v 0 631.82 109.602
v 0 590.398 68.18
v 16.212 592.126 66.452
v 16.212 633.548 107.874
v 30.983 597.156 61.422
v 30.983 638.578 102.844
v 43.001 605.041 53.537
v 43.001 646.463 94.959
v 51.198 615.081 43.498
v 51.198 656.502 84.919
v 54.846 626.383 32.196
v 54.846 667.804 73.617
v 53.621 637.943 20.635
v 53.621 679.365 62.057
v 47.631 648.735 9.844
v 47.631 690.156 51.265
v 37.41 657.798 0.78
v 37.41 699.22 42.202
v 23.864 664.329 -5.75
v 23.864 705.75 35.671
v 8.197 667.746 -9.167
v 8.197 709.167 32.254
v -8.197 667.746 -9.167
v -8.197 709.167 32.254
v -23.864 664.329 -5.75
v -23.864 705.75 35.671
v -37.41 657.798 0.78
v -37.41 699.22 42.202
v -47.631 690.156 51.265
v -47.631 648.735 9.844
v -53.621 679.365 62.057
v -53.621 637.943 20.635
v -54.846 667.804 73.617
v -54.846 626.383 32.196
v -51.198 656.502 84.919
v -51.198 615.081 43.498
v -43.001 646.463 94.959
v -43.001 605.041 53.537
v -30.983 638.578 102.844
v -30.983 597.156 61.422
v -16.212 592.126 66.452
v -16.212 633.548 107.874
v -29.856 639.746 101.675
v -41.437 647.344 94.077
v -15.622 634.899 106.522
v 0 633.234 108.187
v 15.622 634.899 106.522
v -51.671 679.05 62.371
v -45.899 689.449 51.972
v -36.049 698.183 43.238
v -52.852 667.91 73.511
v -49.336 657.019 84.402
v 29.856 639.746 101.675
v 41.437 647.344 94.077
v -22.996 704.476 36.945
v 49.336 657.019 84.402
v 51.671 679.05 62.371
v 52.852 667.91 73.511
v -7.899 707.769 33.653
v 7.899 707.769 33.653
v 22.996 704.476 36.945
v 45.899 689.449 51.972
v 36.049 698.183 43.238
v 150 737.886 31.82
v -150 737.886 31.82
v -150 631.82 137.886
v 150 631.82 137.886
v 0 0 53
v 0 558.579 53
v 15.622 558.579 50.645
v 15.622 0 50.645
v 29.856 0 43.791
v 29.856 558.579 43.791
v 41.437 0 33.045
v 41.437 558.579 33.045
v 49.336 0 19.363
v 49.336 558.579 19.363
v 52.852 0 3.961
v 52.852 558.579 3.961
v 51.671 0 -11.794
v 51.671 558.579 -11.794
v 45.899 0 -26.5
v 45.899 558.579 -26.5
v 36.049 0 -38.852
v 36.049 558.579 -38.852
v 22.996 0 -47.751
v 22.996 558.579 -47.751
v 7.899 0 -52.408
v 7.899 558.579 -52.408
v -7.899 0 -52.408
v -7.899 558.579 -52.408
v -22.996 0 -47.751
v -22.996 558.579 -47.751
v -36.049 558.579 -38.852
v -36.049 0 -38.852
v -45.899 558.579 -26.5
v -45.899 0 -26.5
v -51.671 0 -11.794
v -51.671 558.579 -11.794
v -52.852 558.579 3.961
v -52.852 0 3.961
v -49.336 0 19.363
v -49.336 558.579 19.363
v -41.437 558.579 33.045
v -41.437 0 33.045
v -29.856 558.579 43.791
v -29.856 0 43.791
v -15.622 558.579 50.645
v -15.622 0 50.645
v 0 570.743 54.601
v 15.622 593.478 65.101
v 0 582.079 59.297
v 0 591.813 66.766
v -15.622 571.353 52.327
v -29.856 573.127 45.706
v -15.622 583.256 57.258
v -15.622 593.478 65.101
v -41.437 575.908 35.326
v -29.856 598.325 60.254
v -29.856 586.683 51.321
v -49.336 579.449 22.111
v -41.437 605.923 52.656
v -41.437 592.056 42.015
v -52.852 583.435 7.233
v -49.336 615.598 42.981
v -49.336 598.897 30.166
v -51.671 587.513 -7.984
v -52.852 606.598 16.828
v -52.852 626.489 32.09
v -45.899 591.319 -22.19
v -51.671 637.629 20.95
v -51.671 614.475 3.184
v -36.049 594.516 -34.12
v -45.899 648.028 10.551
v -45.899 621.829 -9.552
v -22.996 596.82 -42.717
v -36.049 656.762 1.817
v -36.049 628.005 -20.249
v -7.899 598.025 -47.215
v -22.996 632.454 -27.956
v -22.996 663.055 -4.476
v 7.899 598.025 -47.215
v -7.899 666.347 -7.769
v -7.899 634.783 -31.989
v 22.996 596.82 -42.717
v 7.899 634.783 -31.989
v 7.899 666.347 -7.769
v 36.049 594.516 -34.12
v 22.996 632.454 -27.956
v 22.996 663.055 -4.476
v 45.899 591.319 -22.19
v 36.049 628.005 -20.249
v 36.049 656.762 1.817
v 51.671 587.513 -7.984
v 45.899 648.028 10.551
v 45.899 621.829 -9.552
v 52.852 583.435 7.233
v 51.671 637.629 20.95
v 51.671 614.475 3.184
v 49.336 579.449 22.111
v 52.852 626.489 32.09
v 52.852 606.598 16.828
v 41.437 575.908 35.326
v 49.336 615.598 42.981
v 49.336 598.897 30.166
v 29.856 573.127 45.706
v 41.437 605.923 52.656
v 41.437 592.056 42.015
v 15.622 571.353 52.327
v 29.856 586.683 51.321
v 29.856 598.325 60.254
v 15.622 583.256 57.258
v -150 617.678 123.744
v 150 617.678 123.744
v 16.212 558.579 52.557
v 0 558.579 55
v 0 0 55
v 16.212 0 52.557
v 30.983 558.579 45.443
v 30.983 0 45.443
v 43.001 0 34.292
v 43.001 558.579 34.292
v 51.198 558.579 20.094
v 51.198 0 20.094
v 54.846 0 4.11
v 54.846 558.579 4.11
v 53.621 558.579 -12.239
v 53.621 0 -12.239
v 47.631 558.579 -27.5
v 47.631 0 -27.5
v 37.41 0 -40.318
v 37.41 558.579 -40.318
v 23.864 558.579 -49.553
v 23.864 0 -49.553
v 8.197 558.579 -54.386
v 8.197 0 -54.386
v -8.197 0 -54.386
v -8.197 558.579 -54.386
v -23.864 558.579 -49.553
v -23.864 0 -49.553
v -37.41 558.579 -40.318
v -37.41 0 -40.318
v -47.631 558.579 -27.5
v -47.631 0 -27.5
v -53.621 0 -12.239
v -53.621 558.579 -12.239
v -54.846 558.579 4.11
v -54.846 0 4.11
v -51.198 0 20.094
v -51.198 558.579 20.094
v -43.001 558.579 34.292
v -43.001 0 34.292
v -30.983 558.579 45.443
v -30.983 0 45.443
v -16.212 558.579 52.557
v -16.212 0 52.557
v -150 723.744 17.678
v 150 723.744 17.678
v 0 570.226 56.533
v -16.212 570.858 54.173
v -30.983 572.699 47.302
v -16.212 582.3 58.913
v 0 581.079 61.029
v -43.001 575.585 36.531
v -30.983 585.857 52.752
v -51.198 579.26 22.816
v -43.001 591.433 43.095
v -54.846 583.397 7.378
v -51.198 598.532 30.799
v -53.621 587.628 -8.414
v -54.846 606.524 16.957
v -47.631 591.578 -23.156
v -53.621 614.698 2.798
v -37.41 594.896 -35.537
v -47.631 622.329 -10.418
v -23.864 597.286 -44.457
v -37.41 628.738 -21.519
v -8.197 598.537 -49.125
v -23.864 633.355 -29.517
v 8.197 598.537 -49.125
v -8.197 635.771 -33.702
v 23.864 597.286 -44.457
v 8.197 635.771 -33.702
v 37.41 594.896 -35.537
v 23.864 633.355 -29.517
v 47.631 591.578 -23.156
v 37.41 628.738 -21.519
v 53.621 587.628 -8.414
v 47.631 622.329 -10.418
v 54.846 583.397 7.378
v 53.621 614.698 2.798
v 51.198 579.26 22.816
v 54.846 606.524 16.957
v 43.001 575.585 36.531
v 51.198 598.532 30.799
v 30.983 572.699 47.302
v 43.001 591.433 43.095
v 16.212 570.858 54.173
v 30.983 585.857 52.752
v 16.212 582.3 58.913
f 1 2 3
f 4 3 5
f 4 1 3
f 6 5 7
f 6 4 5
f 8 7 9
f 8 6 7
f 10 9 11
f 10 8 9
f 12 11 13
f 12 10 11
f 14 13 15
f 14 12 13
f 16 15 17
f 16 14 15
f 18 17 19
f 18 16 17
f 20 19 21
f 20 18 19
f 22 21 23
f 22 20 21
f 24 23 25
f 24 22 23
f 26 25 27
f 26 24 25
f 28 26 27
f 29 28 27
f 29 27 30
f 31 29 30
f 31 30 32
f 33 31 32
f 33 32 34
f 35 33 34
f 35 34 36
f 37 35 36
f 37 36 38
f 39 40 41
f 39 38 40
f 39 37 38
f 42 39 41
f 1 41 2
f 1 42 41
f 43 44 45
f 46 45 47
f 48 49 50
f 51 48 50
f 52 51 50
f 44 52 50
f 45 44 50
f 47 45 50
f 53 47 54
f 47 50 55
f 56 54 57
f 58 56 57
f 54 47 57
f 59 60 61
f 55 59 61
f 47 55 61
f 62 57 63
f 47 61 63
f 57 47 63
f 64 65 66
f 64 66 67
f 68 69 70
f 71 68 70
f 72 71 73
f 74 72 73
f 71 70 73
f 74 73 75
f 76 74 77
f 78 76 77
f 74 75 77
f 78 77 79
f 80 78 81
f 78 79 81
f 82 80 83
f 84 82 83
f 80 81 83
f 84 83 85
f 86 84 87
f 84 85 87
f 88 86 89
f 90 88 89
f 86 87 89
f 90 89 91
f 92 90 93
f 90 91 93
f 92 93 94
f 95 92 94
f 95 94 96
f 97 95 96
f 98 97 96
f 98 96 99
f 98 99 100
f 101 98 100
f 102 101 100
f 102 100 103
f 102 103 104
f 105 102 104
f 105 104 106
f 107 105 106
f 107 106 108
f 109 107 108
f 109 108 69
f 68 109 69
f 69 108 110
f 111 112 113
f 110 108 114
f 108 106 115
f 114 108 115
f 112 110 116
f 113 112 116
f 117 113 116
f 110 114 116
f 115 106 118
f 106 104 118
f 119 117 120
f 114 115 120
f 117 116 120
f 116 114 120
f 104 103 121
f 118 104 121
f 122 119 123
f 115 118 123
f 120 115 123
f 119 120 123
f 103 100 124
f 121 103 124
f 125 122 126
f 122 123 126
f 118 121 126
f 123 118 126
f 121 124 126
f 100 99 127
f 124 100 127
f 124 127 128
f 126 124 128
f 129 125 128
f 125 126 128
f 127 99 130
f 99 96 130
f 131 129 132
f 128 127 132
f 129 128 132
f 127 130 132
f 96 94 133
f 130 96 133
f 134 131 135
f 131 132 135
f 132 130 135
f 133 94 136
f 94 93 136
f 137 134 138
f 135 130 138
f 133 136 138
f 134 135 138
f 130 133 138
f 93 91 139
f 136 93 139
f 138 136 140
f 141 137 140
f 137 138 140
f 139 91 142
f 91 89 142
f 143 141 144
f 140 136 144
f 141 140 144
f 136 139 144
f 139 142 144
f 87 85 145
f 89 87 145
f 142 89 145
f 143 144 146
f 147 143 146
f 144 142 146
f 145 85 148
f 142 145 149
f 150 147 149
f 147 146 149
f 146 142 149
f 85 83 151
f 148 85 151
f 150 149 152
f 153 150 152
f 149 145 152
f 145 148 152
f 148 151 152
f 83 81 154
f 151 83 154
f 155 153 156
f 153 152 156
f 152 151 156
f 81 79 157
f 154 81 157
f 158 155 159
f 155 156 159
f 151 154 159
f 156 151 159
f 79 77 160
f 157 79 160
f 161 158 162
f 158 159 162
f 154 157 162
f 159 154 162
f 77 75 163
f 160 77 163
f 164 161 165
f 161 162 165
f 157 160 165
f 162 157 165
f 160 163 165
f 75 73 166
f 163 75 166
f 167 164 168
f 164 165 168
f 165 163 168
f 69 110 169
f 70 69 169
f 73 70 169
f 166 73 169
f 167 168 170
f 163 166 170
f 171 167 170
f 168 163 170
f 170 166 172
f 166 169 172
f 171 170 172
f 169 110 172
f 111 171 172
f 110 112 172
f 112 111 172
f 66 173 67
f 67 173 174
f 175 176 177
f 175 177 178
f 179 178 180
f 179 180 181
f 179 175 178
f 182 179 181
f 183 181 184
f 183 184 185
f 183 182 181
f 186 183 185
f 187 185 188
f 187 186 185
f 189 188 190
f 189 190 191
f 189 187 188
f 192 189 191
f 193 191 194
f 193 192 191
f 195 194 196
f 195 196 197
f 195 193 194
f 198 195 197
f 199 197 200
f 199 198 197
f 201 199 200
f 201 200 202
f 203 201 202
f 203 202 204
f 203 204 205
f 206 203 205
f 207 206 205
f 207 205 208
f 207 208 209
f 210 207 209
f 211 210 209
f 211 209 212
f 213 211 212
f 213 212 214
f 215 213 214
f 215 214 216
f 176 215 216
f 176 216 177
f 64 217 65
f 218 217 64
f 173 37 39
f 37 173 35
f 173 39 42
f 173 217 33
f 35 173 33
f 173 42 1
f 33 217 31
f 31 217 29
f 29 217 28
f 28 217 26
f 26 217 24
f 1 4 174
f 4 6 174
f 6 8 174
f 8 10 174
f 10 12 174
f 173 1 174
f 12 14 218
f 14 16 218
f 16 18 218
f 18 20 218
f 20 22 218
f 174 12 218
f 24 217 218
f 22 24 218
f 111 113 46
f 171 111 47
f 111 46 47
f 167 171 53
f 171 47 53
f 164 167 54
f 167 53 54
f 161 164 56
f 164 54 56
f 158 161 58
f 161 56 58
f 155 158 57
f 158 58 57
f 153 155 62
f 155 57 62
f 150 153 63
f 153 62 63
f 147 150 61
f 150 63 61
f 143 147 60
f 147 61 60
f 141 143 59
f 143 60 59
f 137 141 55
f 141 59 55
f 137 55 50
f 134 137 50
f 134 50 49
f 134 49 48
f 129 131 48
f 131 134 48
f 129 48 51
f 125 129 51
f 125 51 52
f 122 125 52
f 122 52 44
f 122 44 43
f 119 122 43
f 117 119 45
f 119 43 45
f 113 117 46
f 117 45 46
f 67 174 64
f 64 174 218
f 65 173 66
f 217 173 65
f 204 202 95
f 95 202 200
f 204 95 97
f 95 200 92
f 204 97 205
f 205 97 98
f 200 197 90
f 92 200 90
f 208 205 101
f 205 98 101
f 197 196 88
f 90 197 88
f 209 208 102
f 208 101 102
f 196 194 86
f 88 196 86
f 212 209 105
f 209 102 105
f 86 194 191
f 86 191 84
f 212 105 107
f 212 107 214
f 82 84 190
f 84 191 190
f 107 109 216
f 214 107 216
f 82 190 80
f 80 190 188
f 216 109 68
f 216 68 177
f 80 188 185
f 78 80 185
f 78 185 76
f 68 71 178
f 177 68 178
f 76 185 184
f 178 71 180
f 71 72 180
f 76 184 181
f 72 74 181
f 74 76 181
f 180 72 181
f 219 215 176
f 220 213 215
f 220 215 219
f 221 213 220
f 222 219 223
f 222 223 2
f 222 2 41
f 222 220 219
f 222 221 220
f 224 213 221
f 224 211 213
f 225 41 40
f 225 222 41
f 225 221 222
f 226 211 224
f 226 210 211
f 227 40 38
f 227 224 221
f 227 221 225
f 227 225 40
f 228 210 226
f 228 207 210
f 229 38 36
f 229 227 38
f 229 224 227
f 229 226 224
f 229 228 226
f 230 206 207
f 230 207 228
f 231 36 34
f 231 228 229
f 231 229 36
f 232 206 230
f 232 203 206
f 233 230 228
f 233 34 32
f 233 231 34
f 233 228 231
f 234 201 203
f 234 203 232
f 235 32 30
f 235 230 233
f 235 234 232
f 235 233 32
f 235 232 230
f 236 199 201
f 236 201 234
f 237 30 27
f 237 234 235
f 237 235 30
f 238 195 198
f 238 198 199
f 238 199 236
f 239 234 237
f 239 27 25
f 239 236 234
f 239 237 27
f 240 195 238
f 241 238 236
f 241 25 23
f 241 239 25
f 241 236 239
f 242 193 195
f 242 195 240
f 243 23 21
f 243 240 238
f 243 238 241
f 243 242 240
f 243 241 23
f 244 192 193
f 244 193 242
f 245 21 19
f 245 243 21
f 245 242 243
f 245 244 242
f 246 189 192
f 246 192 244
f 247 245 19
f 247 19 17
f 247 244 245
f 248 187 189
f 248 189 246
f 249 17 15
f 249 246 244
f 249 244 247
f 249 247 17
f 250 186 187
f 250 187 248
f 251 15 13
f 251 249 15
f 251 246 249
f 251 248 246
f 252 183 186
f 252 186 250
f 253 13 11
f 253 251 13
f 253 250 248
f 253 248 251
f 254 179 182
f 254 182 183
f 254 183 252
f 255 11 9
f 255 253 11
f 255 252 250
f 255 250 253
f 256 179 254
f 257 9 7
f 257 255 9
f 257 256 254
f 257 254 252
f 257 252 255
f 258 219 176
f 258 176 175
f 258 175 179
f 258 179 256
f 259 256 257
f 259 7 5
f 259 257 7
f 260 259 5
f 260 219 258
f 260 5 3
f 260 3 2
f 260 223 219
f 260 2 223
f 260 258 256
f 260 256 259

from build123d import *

# Parameters (mm, degrees)
SWEEP_THIN1_PROFILE_R   = 55
SWEEP_THIN1_PROFILE_R_2 = 53
SKETCH69_W              = 300
SKETCH69_H              = 150
BOSS_EXTRUDE1_DEPTH     = 20


with BuildPart() as part:
    # Sweep-Thin1: sweep along a path in Sketch2
    with BuildLine(Plane(origin=(0, 0, 0), x_dir=(0, 0, -1), z_dir=(1, 0, 0))) as sweep_thin1_path:
        Line((0, 0), (0, 558.578643763))
        ThreePointArc((0, 558.578643763), (-7.612046749, 596.846986999), (-29.289321881, 629.289321881))
        Line((-29.289321881, 629.289321881), (-70.710678119, 670.710678119))
    # Sweep-Thin1 profile (on start of the path) → Sweep-Thin1 (sweep)
    with BuildSketch(Plane.ZX):
        Circle(SWEEP_THIN1_PROFILE_R)
        Circle(SWEEP_THIN1_PROFILE_R_2, mode=Mode.SUBTRACT)
    sweep(path=sweep_thin1_path.line)

    # Sketch69 → Boss-Extrude1 (add)
    with BuildSketch(Plane(origin=(0, 370.710678119, 370.710678119), x_dir=(1, 0, 0), z_dir=(0, 0.7071067811865489, 0.7071067811865461))):
        with Locations((0, 424.264068712)):
            Rectangle(SKETCH69_W, SKETCH69_H)
    extrude(amount=BOSS_EXTRUDE1_DEPTH)


solid = part.part
